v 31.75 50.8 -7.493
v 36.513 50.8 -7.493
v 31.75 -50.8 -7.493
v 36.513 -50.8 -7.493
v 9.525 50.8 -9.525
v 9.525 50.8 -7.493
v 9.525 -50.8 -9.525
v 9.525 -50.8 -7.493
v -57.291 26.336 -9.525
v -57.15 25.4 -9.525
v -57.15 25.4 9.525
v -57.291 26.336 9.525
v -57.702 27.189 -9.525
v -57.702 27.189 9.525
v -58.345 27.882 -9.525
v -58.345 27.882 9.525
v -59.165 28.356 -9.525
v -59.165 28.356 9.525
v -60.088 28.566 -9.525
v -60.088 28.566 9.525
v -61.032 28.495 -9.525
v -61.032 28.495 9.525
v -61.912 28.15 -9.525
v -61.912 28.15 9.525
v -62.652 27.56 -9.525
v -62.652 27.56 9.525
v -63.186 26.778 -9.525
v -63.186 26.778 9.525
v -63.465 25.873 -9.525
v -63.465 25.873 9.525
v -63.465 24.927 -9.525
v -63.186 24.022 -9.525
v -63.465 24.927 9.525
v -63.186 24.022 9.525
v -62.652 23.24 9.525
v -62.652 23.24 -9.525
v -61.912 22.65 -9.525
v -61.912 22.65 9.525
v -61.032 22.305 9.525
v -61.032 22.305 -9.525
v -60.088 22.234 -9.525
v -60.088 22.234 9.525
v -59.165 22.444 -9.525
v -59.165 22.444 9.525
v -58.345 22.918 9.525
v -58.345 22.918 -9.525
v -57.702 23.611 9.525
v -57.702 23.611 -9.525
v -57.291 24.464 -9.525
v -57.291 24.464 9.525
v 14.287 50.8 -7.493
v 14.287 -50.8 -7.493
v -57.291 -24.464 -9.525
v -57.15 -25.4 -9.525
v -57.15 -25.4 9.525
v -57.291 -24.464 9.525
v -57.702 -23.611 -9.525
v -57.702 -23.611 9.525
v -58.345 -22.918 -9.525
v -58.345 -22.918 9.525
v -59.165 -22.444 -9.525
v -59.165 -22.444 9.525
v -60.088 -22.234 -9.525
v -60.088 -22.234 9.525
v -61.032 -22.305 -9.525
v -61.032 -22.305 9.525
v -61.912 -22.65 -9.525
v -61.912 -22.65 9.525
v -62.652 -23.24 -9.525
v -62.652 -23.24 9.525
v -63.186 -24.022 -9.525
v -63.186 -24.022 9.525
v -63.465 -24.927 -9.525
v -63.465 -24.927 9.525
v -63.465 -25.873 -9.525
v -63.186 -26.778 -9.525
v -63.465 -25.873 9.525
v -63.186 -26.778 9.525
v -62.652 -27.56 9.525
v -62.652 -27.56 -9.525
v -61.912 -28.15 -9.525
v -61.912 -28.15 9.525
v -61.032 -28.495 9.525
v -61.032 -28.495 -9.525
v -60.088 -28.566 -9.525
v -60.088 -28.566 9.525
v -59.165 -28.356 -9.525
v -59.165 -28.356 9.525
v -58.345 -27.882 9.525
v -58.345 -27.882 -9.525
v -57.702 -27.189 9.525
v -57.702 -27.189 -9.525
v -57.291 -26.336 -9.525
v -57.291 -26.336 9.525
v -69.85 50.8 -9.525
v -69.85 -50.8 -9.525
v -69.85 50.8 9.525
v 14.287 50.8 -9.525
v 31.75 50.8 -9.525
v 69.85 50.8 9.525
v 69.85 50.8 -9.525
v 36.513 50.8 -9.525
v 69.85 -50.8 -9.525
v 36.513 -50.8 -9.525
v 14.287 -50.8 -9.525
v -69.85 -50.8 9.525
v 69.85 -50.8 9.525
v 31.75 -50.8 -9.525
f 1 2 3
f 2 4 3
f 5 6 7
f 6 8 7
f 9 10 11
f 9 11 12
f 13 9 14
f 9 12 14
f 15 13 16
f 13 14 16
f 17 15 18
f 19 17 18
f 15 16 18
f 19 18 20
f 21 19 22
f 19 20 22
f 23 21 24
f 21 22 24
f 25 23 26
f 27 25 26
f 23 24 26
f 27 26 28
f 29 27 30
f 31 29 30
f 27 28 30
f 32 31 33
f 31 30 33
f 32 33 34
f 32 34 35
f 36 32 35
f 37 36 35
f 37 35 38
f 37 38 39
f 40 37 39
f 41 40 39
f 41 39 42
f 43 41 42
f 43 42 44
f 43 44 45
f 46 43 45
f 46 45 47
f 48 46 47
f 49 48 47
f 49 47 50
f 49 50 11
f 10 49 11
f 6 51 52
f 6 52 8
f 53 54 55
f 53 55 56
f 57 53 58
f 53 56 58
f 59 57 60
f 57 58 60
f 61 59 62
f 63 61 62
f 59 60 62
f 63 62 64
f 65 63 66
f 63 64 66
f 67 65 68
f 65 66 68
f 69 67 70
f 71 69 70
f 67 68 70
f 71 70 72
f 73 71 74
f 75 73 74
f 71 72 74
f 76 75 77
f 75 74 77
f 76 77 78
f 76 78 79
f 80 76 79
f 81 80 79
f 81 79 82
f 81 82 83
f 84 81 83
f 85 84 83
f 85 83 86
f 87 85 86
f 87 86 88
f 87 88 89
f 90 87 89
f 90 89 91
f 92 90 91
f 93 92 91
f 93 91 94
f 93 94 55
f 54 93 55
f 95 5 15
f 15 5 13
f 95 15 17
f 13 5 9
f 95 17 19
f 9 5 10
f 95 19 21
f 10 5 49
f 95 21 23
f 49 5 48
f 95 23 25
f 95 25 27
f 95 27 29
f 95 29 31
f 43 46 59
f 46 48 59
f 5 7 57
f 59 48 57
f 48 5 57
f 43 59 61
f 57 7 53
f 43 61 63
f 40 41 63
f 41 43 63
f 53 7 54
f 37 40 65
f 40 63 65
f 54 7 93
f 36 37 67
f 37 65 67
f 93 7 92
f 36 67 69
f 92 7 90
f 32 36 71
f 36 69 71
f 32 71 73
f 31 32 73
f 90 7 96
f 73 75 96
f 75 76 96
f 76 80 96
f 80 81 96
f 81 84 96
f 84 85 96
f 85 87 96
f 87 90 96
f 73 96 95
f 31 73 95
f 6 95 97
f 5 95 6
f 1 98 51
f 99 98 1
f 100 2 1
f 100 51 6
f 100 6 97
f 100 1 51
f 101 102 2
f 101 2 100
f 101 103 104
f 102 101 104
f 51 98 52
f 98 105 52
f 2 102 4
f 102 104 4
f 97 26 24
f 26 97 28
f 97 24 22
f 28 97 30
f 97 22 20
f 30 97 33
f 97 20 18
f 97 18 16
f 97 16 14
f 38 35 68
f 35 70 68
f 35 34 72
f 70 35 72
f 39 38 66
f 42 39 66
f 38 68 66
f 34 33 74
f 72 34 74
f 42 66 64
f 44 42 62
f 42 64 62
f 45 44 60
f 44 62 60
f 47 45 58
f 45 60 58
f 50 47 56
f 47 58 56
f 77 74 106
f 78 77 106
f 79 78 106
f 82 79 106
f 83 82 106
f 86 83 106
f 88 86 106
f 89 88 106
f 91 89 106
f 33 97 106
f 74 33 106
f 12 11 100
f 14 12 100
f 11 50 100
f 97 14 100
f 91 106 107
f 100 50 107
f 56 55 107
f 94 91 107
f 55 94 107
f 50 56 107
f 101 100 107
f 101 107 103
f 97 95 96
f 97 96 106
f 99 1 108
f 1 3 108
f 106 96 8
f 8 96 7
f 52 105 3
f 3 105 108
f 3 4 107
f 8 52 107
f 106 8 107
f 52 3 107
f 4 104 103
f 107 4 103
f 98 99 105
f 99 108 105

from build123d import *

# Parameters (mm, degrees)
BOSS_EXTRUDE3_DEPTH         = 50.8
F_1_4_0_25_DIAMETER_HOLE1_D = 6.35


with BuildPart() as part:
    # 3DSketch2 → Boss-Extrude3 (new, symmetric)
    with BuildSketch(Plane(origin=(69.85, 0, -9.525), x_dir=(-0.990830168044299, 0, 0.1351132047333135), z_dir=(0, -1, 0))):
        Polygon((0, 0), (33.031800727, 4.504336463), (33.306350759, 2.490969561), (38.025179435, 3.134446199), (37.750629402, 5.1478131), (55.053001212, 7.507227438), (55.327551244, 5.493860537), (60.046379919, 6.137337174), (59.771829887, 8.150704076), (138.418974476, 18.875314701), (140.992881026, 0), (2.57390655, -18.875314701), align=None)
    extrude(amount=BOSS_EXTRUDE3_DEPTH, both=True)

    # 1/4 (0.25) Diameter Hole1 (through all)
    with Locations(Plane(origin=(0, 0, -9.525), x_dir=(-1, 0, 0), z_dir=(0, 0, -1))):
        with Locations((60.325, -25.4), (60.325, 25.4)):
            Hole(F_1_4_0_25_DIAMETER_HOLE1_D / 2)


solid = part.part
